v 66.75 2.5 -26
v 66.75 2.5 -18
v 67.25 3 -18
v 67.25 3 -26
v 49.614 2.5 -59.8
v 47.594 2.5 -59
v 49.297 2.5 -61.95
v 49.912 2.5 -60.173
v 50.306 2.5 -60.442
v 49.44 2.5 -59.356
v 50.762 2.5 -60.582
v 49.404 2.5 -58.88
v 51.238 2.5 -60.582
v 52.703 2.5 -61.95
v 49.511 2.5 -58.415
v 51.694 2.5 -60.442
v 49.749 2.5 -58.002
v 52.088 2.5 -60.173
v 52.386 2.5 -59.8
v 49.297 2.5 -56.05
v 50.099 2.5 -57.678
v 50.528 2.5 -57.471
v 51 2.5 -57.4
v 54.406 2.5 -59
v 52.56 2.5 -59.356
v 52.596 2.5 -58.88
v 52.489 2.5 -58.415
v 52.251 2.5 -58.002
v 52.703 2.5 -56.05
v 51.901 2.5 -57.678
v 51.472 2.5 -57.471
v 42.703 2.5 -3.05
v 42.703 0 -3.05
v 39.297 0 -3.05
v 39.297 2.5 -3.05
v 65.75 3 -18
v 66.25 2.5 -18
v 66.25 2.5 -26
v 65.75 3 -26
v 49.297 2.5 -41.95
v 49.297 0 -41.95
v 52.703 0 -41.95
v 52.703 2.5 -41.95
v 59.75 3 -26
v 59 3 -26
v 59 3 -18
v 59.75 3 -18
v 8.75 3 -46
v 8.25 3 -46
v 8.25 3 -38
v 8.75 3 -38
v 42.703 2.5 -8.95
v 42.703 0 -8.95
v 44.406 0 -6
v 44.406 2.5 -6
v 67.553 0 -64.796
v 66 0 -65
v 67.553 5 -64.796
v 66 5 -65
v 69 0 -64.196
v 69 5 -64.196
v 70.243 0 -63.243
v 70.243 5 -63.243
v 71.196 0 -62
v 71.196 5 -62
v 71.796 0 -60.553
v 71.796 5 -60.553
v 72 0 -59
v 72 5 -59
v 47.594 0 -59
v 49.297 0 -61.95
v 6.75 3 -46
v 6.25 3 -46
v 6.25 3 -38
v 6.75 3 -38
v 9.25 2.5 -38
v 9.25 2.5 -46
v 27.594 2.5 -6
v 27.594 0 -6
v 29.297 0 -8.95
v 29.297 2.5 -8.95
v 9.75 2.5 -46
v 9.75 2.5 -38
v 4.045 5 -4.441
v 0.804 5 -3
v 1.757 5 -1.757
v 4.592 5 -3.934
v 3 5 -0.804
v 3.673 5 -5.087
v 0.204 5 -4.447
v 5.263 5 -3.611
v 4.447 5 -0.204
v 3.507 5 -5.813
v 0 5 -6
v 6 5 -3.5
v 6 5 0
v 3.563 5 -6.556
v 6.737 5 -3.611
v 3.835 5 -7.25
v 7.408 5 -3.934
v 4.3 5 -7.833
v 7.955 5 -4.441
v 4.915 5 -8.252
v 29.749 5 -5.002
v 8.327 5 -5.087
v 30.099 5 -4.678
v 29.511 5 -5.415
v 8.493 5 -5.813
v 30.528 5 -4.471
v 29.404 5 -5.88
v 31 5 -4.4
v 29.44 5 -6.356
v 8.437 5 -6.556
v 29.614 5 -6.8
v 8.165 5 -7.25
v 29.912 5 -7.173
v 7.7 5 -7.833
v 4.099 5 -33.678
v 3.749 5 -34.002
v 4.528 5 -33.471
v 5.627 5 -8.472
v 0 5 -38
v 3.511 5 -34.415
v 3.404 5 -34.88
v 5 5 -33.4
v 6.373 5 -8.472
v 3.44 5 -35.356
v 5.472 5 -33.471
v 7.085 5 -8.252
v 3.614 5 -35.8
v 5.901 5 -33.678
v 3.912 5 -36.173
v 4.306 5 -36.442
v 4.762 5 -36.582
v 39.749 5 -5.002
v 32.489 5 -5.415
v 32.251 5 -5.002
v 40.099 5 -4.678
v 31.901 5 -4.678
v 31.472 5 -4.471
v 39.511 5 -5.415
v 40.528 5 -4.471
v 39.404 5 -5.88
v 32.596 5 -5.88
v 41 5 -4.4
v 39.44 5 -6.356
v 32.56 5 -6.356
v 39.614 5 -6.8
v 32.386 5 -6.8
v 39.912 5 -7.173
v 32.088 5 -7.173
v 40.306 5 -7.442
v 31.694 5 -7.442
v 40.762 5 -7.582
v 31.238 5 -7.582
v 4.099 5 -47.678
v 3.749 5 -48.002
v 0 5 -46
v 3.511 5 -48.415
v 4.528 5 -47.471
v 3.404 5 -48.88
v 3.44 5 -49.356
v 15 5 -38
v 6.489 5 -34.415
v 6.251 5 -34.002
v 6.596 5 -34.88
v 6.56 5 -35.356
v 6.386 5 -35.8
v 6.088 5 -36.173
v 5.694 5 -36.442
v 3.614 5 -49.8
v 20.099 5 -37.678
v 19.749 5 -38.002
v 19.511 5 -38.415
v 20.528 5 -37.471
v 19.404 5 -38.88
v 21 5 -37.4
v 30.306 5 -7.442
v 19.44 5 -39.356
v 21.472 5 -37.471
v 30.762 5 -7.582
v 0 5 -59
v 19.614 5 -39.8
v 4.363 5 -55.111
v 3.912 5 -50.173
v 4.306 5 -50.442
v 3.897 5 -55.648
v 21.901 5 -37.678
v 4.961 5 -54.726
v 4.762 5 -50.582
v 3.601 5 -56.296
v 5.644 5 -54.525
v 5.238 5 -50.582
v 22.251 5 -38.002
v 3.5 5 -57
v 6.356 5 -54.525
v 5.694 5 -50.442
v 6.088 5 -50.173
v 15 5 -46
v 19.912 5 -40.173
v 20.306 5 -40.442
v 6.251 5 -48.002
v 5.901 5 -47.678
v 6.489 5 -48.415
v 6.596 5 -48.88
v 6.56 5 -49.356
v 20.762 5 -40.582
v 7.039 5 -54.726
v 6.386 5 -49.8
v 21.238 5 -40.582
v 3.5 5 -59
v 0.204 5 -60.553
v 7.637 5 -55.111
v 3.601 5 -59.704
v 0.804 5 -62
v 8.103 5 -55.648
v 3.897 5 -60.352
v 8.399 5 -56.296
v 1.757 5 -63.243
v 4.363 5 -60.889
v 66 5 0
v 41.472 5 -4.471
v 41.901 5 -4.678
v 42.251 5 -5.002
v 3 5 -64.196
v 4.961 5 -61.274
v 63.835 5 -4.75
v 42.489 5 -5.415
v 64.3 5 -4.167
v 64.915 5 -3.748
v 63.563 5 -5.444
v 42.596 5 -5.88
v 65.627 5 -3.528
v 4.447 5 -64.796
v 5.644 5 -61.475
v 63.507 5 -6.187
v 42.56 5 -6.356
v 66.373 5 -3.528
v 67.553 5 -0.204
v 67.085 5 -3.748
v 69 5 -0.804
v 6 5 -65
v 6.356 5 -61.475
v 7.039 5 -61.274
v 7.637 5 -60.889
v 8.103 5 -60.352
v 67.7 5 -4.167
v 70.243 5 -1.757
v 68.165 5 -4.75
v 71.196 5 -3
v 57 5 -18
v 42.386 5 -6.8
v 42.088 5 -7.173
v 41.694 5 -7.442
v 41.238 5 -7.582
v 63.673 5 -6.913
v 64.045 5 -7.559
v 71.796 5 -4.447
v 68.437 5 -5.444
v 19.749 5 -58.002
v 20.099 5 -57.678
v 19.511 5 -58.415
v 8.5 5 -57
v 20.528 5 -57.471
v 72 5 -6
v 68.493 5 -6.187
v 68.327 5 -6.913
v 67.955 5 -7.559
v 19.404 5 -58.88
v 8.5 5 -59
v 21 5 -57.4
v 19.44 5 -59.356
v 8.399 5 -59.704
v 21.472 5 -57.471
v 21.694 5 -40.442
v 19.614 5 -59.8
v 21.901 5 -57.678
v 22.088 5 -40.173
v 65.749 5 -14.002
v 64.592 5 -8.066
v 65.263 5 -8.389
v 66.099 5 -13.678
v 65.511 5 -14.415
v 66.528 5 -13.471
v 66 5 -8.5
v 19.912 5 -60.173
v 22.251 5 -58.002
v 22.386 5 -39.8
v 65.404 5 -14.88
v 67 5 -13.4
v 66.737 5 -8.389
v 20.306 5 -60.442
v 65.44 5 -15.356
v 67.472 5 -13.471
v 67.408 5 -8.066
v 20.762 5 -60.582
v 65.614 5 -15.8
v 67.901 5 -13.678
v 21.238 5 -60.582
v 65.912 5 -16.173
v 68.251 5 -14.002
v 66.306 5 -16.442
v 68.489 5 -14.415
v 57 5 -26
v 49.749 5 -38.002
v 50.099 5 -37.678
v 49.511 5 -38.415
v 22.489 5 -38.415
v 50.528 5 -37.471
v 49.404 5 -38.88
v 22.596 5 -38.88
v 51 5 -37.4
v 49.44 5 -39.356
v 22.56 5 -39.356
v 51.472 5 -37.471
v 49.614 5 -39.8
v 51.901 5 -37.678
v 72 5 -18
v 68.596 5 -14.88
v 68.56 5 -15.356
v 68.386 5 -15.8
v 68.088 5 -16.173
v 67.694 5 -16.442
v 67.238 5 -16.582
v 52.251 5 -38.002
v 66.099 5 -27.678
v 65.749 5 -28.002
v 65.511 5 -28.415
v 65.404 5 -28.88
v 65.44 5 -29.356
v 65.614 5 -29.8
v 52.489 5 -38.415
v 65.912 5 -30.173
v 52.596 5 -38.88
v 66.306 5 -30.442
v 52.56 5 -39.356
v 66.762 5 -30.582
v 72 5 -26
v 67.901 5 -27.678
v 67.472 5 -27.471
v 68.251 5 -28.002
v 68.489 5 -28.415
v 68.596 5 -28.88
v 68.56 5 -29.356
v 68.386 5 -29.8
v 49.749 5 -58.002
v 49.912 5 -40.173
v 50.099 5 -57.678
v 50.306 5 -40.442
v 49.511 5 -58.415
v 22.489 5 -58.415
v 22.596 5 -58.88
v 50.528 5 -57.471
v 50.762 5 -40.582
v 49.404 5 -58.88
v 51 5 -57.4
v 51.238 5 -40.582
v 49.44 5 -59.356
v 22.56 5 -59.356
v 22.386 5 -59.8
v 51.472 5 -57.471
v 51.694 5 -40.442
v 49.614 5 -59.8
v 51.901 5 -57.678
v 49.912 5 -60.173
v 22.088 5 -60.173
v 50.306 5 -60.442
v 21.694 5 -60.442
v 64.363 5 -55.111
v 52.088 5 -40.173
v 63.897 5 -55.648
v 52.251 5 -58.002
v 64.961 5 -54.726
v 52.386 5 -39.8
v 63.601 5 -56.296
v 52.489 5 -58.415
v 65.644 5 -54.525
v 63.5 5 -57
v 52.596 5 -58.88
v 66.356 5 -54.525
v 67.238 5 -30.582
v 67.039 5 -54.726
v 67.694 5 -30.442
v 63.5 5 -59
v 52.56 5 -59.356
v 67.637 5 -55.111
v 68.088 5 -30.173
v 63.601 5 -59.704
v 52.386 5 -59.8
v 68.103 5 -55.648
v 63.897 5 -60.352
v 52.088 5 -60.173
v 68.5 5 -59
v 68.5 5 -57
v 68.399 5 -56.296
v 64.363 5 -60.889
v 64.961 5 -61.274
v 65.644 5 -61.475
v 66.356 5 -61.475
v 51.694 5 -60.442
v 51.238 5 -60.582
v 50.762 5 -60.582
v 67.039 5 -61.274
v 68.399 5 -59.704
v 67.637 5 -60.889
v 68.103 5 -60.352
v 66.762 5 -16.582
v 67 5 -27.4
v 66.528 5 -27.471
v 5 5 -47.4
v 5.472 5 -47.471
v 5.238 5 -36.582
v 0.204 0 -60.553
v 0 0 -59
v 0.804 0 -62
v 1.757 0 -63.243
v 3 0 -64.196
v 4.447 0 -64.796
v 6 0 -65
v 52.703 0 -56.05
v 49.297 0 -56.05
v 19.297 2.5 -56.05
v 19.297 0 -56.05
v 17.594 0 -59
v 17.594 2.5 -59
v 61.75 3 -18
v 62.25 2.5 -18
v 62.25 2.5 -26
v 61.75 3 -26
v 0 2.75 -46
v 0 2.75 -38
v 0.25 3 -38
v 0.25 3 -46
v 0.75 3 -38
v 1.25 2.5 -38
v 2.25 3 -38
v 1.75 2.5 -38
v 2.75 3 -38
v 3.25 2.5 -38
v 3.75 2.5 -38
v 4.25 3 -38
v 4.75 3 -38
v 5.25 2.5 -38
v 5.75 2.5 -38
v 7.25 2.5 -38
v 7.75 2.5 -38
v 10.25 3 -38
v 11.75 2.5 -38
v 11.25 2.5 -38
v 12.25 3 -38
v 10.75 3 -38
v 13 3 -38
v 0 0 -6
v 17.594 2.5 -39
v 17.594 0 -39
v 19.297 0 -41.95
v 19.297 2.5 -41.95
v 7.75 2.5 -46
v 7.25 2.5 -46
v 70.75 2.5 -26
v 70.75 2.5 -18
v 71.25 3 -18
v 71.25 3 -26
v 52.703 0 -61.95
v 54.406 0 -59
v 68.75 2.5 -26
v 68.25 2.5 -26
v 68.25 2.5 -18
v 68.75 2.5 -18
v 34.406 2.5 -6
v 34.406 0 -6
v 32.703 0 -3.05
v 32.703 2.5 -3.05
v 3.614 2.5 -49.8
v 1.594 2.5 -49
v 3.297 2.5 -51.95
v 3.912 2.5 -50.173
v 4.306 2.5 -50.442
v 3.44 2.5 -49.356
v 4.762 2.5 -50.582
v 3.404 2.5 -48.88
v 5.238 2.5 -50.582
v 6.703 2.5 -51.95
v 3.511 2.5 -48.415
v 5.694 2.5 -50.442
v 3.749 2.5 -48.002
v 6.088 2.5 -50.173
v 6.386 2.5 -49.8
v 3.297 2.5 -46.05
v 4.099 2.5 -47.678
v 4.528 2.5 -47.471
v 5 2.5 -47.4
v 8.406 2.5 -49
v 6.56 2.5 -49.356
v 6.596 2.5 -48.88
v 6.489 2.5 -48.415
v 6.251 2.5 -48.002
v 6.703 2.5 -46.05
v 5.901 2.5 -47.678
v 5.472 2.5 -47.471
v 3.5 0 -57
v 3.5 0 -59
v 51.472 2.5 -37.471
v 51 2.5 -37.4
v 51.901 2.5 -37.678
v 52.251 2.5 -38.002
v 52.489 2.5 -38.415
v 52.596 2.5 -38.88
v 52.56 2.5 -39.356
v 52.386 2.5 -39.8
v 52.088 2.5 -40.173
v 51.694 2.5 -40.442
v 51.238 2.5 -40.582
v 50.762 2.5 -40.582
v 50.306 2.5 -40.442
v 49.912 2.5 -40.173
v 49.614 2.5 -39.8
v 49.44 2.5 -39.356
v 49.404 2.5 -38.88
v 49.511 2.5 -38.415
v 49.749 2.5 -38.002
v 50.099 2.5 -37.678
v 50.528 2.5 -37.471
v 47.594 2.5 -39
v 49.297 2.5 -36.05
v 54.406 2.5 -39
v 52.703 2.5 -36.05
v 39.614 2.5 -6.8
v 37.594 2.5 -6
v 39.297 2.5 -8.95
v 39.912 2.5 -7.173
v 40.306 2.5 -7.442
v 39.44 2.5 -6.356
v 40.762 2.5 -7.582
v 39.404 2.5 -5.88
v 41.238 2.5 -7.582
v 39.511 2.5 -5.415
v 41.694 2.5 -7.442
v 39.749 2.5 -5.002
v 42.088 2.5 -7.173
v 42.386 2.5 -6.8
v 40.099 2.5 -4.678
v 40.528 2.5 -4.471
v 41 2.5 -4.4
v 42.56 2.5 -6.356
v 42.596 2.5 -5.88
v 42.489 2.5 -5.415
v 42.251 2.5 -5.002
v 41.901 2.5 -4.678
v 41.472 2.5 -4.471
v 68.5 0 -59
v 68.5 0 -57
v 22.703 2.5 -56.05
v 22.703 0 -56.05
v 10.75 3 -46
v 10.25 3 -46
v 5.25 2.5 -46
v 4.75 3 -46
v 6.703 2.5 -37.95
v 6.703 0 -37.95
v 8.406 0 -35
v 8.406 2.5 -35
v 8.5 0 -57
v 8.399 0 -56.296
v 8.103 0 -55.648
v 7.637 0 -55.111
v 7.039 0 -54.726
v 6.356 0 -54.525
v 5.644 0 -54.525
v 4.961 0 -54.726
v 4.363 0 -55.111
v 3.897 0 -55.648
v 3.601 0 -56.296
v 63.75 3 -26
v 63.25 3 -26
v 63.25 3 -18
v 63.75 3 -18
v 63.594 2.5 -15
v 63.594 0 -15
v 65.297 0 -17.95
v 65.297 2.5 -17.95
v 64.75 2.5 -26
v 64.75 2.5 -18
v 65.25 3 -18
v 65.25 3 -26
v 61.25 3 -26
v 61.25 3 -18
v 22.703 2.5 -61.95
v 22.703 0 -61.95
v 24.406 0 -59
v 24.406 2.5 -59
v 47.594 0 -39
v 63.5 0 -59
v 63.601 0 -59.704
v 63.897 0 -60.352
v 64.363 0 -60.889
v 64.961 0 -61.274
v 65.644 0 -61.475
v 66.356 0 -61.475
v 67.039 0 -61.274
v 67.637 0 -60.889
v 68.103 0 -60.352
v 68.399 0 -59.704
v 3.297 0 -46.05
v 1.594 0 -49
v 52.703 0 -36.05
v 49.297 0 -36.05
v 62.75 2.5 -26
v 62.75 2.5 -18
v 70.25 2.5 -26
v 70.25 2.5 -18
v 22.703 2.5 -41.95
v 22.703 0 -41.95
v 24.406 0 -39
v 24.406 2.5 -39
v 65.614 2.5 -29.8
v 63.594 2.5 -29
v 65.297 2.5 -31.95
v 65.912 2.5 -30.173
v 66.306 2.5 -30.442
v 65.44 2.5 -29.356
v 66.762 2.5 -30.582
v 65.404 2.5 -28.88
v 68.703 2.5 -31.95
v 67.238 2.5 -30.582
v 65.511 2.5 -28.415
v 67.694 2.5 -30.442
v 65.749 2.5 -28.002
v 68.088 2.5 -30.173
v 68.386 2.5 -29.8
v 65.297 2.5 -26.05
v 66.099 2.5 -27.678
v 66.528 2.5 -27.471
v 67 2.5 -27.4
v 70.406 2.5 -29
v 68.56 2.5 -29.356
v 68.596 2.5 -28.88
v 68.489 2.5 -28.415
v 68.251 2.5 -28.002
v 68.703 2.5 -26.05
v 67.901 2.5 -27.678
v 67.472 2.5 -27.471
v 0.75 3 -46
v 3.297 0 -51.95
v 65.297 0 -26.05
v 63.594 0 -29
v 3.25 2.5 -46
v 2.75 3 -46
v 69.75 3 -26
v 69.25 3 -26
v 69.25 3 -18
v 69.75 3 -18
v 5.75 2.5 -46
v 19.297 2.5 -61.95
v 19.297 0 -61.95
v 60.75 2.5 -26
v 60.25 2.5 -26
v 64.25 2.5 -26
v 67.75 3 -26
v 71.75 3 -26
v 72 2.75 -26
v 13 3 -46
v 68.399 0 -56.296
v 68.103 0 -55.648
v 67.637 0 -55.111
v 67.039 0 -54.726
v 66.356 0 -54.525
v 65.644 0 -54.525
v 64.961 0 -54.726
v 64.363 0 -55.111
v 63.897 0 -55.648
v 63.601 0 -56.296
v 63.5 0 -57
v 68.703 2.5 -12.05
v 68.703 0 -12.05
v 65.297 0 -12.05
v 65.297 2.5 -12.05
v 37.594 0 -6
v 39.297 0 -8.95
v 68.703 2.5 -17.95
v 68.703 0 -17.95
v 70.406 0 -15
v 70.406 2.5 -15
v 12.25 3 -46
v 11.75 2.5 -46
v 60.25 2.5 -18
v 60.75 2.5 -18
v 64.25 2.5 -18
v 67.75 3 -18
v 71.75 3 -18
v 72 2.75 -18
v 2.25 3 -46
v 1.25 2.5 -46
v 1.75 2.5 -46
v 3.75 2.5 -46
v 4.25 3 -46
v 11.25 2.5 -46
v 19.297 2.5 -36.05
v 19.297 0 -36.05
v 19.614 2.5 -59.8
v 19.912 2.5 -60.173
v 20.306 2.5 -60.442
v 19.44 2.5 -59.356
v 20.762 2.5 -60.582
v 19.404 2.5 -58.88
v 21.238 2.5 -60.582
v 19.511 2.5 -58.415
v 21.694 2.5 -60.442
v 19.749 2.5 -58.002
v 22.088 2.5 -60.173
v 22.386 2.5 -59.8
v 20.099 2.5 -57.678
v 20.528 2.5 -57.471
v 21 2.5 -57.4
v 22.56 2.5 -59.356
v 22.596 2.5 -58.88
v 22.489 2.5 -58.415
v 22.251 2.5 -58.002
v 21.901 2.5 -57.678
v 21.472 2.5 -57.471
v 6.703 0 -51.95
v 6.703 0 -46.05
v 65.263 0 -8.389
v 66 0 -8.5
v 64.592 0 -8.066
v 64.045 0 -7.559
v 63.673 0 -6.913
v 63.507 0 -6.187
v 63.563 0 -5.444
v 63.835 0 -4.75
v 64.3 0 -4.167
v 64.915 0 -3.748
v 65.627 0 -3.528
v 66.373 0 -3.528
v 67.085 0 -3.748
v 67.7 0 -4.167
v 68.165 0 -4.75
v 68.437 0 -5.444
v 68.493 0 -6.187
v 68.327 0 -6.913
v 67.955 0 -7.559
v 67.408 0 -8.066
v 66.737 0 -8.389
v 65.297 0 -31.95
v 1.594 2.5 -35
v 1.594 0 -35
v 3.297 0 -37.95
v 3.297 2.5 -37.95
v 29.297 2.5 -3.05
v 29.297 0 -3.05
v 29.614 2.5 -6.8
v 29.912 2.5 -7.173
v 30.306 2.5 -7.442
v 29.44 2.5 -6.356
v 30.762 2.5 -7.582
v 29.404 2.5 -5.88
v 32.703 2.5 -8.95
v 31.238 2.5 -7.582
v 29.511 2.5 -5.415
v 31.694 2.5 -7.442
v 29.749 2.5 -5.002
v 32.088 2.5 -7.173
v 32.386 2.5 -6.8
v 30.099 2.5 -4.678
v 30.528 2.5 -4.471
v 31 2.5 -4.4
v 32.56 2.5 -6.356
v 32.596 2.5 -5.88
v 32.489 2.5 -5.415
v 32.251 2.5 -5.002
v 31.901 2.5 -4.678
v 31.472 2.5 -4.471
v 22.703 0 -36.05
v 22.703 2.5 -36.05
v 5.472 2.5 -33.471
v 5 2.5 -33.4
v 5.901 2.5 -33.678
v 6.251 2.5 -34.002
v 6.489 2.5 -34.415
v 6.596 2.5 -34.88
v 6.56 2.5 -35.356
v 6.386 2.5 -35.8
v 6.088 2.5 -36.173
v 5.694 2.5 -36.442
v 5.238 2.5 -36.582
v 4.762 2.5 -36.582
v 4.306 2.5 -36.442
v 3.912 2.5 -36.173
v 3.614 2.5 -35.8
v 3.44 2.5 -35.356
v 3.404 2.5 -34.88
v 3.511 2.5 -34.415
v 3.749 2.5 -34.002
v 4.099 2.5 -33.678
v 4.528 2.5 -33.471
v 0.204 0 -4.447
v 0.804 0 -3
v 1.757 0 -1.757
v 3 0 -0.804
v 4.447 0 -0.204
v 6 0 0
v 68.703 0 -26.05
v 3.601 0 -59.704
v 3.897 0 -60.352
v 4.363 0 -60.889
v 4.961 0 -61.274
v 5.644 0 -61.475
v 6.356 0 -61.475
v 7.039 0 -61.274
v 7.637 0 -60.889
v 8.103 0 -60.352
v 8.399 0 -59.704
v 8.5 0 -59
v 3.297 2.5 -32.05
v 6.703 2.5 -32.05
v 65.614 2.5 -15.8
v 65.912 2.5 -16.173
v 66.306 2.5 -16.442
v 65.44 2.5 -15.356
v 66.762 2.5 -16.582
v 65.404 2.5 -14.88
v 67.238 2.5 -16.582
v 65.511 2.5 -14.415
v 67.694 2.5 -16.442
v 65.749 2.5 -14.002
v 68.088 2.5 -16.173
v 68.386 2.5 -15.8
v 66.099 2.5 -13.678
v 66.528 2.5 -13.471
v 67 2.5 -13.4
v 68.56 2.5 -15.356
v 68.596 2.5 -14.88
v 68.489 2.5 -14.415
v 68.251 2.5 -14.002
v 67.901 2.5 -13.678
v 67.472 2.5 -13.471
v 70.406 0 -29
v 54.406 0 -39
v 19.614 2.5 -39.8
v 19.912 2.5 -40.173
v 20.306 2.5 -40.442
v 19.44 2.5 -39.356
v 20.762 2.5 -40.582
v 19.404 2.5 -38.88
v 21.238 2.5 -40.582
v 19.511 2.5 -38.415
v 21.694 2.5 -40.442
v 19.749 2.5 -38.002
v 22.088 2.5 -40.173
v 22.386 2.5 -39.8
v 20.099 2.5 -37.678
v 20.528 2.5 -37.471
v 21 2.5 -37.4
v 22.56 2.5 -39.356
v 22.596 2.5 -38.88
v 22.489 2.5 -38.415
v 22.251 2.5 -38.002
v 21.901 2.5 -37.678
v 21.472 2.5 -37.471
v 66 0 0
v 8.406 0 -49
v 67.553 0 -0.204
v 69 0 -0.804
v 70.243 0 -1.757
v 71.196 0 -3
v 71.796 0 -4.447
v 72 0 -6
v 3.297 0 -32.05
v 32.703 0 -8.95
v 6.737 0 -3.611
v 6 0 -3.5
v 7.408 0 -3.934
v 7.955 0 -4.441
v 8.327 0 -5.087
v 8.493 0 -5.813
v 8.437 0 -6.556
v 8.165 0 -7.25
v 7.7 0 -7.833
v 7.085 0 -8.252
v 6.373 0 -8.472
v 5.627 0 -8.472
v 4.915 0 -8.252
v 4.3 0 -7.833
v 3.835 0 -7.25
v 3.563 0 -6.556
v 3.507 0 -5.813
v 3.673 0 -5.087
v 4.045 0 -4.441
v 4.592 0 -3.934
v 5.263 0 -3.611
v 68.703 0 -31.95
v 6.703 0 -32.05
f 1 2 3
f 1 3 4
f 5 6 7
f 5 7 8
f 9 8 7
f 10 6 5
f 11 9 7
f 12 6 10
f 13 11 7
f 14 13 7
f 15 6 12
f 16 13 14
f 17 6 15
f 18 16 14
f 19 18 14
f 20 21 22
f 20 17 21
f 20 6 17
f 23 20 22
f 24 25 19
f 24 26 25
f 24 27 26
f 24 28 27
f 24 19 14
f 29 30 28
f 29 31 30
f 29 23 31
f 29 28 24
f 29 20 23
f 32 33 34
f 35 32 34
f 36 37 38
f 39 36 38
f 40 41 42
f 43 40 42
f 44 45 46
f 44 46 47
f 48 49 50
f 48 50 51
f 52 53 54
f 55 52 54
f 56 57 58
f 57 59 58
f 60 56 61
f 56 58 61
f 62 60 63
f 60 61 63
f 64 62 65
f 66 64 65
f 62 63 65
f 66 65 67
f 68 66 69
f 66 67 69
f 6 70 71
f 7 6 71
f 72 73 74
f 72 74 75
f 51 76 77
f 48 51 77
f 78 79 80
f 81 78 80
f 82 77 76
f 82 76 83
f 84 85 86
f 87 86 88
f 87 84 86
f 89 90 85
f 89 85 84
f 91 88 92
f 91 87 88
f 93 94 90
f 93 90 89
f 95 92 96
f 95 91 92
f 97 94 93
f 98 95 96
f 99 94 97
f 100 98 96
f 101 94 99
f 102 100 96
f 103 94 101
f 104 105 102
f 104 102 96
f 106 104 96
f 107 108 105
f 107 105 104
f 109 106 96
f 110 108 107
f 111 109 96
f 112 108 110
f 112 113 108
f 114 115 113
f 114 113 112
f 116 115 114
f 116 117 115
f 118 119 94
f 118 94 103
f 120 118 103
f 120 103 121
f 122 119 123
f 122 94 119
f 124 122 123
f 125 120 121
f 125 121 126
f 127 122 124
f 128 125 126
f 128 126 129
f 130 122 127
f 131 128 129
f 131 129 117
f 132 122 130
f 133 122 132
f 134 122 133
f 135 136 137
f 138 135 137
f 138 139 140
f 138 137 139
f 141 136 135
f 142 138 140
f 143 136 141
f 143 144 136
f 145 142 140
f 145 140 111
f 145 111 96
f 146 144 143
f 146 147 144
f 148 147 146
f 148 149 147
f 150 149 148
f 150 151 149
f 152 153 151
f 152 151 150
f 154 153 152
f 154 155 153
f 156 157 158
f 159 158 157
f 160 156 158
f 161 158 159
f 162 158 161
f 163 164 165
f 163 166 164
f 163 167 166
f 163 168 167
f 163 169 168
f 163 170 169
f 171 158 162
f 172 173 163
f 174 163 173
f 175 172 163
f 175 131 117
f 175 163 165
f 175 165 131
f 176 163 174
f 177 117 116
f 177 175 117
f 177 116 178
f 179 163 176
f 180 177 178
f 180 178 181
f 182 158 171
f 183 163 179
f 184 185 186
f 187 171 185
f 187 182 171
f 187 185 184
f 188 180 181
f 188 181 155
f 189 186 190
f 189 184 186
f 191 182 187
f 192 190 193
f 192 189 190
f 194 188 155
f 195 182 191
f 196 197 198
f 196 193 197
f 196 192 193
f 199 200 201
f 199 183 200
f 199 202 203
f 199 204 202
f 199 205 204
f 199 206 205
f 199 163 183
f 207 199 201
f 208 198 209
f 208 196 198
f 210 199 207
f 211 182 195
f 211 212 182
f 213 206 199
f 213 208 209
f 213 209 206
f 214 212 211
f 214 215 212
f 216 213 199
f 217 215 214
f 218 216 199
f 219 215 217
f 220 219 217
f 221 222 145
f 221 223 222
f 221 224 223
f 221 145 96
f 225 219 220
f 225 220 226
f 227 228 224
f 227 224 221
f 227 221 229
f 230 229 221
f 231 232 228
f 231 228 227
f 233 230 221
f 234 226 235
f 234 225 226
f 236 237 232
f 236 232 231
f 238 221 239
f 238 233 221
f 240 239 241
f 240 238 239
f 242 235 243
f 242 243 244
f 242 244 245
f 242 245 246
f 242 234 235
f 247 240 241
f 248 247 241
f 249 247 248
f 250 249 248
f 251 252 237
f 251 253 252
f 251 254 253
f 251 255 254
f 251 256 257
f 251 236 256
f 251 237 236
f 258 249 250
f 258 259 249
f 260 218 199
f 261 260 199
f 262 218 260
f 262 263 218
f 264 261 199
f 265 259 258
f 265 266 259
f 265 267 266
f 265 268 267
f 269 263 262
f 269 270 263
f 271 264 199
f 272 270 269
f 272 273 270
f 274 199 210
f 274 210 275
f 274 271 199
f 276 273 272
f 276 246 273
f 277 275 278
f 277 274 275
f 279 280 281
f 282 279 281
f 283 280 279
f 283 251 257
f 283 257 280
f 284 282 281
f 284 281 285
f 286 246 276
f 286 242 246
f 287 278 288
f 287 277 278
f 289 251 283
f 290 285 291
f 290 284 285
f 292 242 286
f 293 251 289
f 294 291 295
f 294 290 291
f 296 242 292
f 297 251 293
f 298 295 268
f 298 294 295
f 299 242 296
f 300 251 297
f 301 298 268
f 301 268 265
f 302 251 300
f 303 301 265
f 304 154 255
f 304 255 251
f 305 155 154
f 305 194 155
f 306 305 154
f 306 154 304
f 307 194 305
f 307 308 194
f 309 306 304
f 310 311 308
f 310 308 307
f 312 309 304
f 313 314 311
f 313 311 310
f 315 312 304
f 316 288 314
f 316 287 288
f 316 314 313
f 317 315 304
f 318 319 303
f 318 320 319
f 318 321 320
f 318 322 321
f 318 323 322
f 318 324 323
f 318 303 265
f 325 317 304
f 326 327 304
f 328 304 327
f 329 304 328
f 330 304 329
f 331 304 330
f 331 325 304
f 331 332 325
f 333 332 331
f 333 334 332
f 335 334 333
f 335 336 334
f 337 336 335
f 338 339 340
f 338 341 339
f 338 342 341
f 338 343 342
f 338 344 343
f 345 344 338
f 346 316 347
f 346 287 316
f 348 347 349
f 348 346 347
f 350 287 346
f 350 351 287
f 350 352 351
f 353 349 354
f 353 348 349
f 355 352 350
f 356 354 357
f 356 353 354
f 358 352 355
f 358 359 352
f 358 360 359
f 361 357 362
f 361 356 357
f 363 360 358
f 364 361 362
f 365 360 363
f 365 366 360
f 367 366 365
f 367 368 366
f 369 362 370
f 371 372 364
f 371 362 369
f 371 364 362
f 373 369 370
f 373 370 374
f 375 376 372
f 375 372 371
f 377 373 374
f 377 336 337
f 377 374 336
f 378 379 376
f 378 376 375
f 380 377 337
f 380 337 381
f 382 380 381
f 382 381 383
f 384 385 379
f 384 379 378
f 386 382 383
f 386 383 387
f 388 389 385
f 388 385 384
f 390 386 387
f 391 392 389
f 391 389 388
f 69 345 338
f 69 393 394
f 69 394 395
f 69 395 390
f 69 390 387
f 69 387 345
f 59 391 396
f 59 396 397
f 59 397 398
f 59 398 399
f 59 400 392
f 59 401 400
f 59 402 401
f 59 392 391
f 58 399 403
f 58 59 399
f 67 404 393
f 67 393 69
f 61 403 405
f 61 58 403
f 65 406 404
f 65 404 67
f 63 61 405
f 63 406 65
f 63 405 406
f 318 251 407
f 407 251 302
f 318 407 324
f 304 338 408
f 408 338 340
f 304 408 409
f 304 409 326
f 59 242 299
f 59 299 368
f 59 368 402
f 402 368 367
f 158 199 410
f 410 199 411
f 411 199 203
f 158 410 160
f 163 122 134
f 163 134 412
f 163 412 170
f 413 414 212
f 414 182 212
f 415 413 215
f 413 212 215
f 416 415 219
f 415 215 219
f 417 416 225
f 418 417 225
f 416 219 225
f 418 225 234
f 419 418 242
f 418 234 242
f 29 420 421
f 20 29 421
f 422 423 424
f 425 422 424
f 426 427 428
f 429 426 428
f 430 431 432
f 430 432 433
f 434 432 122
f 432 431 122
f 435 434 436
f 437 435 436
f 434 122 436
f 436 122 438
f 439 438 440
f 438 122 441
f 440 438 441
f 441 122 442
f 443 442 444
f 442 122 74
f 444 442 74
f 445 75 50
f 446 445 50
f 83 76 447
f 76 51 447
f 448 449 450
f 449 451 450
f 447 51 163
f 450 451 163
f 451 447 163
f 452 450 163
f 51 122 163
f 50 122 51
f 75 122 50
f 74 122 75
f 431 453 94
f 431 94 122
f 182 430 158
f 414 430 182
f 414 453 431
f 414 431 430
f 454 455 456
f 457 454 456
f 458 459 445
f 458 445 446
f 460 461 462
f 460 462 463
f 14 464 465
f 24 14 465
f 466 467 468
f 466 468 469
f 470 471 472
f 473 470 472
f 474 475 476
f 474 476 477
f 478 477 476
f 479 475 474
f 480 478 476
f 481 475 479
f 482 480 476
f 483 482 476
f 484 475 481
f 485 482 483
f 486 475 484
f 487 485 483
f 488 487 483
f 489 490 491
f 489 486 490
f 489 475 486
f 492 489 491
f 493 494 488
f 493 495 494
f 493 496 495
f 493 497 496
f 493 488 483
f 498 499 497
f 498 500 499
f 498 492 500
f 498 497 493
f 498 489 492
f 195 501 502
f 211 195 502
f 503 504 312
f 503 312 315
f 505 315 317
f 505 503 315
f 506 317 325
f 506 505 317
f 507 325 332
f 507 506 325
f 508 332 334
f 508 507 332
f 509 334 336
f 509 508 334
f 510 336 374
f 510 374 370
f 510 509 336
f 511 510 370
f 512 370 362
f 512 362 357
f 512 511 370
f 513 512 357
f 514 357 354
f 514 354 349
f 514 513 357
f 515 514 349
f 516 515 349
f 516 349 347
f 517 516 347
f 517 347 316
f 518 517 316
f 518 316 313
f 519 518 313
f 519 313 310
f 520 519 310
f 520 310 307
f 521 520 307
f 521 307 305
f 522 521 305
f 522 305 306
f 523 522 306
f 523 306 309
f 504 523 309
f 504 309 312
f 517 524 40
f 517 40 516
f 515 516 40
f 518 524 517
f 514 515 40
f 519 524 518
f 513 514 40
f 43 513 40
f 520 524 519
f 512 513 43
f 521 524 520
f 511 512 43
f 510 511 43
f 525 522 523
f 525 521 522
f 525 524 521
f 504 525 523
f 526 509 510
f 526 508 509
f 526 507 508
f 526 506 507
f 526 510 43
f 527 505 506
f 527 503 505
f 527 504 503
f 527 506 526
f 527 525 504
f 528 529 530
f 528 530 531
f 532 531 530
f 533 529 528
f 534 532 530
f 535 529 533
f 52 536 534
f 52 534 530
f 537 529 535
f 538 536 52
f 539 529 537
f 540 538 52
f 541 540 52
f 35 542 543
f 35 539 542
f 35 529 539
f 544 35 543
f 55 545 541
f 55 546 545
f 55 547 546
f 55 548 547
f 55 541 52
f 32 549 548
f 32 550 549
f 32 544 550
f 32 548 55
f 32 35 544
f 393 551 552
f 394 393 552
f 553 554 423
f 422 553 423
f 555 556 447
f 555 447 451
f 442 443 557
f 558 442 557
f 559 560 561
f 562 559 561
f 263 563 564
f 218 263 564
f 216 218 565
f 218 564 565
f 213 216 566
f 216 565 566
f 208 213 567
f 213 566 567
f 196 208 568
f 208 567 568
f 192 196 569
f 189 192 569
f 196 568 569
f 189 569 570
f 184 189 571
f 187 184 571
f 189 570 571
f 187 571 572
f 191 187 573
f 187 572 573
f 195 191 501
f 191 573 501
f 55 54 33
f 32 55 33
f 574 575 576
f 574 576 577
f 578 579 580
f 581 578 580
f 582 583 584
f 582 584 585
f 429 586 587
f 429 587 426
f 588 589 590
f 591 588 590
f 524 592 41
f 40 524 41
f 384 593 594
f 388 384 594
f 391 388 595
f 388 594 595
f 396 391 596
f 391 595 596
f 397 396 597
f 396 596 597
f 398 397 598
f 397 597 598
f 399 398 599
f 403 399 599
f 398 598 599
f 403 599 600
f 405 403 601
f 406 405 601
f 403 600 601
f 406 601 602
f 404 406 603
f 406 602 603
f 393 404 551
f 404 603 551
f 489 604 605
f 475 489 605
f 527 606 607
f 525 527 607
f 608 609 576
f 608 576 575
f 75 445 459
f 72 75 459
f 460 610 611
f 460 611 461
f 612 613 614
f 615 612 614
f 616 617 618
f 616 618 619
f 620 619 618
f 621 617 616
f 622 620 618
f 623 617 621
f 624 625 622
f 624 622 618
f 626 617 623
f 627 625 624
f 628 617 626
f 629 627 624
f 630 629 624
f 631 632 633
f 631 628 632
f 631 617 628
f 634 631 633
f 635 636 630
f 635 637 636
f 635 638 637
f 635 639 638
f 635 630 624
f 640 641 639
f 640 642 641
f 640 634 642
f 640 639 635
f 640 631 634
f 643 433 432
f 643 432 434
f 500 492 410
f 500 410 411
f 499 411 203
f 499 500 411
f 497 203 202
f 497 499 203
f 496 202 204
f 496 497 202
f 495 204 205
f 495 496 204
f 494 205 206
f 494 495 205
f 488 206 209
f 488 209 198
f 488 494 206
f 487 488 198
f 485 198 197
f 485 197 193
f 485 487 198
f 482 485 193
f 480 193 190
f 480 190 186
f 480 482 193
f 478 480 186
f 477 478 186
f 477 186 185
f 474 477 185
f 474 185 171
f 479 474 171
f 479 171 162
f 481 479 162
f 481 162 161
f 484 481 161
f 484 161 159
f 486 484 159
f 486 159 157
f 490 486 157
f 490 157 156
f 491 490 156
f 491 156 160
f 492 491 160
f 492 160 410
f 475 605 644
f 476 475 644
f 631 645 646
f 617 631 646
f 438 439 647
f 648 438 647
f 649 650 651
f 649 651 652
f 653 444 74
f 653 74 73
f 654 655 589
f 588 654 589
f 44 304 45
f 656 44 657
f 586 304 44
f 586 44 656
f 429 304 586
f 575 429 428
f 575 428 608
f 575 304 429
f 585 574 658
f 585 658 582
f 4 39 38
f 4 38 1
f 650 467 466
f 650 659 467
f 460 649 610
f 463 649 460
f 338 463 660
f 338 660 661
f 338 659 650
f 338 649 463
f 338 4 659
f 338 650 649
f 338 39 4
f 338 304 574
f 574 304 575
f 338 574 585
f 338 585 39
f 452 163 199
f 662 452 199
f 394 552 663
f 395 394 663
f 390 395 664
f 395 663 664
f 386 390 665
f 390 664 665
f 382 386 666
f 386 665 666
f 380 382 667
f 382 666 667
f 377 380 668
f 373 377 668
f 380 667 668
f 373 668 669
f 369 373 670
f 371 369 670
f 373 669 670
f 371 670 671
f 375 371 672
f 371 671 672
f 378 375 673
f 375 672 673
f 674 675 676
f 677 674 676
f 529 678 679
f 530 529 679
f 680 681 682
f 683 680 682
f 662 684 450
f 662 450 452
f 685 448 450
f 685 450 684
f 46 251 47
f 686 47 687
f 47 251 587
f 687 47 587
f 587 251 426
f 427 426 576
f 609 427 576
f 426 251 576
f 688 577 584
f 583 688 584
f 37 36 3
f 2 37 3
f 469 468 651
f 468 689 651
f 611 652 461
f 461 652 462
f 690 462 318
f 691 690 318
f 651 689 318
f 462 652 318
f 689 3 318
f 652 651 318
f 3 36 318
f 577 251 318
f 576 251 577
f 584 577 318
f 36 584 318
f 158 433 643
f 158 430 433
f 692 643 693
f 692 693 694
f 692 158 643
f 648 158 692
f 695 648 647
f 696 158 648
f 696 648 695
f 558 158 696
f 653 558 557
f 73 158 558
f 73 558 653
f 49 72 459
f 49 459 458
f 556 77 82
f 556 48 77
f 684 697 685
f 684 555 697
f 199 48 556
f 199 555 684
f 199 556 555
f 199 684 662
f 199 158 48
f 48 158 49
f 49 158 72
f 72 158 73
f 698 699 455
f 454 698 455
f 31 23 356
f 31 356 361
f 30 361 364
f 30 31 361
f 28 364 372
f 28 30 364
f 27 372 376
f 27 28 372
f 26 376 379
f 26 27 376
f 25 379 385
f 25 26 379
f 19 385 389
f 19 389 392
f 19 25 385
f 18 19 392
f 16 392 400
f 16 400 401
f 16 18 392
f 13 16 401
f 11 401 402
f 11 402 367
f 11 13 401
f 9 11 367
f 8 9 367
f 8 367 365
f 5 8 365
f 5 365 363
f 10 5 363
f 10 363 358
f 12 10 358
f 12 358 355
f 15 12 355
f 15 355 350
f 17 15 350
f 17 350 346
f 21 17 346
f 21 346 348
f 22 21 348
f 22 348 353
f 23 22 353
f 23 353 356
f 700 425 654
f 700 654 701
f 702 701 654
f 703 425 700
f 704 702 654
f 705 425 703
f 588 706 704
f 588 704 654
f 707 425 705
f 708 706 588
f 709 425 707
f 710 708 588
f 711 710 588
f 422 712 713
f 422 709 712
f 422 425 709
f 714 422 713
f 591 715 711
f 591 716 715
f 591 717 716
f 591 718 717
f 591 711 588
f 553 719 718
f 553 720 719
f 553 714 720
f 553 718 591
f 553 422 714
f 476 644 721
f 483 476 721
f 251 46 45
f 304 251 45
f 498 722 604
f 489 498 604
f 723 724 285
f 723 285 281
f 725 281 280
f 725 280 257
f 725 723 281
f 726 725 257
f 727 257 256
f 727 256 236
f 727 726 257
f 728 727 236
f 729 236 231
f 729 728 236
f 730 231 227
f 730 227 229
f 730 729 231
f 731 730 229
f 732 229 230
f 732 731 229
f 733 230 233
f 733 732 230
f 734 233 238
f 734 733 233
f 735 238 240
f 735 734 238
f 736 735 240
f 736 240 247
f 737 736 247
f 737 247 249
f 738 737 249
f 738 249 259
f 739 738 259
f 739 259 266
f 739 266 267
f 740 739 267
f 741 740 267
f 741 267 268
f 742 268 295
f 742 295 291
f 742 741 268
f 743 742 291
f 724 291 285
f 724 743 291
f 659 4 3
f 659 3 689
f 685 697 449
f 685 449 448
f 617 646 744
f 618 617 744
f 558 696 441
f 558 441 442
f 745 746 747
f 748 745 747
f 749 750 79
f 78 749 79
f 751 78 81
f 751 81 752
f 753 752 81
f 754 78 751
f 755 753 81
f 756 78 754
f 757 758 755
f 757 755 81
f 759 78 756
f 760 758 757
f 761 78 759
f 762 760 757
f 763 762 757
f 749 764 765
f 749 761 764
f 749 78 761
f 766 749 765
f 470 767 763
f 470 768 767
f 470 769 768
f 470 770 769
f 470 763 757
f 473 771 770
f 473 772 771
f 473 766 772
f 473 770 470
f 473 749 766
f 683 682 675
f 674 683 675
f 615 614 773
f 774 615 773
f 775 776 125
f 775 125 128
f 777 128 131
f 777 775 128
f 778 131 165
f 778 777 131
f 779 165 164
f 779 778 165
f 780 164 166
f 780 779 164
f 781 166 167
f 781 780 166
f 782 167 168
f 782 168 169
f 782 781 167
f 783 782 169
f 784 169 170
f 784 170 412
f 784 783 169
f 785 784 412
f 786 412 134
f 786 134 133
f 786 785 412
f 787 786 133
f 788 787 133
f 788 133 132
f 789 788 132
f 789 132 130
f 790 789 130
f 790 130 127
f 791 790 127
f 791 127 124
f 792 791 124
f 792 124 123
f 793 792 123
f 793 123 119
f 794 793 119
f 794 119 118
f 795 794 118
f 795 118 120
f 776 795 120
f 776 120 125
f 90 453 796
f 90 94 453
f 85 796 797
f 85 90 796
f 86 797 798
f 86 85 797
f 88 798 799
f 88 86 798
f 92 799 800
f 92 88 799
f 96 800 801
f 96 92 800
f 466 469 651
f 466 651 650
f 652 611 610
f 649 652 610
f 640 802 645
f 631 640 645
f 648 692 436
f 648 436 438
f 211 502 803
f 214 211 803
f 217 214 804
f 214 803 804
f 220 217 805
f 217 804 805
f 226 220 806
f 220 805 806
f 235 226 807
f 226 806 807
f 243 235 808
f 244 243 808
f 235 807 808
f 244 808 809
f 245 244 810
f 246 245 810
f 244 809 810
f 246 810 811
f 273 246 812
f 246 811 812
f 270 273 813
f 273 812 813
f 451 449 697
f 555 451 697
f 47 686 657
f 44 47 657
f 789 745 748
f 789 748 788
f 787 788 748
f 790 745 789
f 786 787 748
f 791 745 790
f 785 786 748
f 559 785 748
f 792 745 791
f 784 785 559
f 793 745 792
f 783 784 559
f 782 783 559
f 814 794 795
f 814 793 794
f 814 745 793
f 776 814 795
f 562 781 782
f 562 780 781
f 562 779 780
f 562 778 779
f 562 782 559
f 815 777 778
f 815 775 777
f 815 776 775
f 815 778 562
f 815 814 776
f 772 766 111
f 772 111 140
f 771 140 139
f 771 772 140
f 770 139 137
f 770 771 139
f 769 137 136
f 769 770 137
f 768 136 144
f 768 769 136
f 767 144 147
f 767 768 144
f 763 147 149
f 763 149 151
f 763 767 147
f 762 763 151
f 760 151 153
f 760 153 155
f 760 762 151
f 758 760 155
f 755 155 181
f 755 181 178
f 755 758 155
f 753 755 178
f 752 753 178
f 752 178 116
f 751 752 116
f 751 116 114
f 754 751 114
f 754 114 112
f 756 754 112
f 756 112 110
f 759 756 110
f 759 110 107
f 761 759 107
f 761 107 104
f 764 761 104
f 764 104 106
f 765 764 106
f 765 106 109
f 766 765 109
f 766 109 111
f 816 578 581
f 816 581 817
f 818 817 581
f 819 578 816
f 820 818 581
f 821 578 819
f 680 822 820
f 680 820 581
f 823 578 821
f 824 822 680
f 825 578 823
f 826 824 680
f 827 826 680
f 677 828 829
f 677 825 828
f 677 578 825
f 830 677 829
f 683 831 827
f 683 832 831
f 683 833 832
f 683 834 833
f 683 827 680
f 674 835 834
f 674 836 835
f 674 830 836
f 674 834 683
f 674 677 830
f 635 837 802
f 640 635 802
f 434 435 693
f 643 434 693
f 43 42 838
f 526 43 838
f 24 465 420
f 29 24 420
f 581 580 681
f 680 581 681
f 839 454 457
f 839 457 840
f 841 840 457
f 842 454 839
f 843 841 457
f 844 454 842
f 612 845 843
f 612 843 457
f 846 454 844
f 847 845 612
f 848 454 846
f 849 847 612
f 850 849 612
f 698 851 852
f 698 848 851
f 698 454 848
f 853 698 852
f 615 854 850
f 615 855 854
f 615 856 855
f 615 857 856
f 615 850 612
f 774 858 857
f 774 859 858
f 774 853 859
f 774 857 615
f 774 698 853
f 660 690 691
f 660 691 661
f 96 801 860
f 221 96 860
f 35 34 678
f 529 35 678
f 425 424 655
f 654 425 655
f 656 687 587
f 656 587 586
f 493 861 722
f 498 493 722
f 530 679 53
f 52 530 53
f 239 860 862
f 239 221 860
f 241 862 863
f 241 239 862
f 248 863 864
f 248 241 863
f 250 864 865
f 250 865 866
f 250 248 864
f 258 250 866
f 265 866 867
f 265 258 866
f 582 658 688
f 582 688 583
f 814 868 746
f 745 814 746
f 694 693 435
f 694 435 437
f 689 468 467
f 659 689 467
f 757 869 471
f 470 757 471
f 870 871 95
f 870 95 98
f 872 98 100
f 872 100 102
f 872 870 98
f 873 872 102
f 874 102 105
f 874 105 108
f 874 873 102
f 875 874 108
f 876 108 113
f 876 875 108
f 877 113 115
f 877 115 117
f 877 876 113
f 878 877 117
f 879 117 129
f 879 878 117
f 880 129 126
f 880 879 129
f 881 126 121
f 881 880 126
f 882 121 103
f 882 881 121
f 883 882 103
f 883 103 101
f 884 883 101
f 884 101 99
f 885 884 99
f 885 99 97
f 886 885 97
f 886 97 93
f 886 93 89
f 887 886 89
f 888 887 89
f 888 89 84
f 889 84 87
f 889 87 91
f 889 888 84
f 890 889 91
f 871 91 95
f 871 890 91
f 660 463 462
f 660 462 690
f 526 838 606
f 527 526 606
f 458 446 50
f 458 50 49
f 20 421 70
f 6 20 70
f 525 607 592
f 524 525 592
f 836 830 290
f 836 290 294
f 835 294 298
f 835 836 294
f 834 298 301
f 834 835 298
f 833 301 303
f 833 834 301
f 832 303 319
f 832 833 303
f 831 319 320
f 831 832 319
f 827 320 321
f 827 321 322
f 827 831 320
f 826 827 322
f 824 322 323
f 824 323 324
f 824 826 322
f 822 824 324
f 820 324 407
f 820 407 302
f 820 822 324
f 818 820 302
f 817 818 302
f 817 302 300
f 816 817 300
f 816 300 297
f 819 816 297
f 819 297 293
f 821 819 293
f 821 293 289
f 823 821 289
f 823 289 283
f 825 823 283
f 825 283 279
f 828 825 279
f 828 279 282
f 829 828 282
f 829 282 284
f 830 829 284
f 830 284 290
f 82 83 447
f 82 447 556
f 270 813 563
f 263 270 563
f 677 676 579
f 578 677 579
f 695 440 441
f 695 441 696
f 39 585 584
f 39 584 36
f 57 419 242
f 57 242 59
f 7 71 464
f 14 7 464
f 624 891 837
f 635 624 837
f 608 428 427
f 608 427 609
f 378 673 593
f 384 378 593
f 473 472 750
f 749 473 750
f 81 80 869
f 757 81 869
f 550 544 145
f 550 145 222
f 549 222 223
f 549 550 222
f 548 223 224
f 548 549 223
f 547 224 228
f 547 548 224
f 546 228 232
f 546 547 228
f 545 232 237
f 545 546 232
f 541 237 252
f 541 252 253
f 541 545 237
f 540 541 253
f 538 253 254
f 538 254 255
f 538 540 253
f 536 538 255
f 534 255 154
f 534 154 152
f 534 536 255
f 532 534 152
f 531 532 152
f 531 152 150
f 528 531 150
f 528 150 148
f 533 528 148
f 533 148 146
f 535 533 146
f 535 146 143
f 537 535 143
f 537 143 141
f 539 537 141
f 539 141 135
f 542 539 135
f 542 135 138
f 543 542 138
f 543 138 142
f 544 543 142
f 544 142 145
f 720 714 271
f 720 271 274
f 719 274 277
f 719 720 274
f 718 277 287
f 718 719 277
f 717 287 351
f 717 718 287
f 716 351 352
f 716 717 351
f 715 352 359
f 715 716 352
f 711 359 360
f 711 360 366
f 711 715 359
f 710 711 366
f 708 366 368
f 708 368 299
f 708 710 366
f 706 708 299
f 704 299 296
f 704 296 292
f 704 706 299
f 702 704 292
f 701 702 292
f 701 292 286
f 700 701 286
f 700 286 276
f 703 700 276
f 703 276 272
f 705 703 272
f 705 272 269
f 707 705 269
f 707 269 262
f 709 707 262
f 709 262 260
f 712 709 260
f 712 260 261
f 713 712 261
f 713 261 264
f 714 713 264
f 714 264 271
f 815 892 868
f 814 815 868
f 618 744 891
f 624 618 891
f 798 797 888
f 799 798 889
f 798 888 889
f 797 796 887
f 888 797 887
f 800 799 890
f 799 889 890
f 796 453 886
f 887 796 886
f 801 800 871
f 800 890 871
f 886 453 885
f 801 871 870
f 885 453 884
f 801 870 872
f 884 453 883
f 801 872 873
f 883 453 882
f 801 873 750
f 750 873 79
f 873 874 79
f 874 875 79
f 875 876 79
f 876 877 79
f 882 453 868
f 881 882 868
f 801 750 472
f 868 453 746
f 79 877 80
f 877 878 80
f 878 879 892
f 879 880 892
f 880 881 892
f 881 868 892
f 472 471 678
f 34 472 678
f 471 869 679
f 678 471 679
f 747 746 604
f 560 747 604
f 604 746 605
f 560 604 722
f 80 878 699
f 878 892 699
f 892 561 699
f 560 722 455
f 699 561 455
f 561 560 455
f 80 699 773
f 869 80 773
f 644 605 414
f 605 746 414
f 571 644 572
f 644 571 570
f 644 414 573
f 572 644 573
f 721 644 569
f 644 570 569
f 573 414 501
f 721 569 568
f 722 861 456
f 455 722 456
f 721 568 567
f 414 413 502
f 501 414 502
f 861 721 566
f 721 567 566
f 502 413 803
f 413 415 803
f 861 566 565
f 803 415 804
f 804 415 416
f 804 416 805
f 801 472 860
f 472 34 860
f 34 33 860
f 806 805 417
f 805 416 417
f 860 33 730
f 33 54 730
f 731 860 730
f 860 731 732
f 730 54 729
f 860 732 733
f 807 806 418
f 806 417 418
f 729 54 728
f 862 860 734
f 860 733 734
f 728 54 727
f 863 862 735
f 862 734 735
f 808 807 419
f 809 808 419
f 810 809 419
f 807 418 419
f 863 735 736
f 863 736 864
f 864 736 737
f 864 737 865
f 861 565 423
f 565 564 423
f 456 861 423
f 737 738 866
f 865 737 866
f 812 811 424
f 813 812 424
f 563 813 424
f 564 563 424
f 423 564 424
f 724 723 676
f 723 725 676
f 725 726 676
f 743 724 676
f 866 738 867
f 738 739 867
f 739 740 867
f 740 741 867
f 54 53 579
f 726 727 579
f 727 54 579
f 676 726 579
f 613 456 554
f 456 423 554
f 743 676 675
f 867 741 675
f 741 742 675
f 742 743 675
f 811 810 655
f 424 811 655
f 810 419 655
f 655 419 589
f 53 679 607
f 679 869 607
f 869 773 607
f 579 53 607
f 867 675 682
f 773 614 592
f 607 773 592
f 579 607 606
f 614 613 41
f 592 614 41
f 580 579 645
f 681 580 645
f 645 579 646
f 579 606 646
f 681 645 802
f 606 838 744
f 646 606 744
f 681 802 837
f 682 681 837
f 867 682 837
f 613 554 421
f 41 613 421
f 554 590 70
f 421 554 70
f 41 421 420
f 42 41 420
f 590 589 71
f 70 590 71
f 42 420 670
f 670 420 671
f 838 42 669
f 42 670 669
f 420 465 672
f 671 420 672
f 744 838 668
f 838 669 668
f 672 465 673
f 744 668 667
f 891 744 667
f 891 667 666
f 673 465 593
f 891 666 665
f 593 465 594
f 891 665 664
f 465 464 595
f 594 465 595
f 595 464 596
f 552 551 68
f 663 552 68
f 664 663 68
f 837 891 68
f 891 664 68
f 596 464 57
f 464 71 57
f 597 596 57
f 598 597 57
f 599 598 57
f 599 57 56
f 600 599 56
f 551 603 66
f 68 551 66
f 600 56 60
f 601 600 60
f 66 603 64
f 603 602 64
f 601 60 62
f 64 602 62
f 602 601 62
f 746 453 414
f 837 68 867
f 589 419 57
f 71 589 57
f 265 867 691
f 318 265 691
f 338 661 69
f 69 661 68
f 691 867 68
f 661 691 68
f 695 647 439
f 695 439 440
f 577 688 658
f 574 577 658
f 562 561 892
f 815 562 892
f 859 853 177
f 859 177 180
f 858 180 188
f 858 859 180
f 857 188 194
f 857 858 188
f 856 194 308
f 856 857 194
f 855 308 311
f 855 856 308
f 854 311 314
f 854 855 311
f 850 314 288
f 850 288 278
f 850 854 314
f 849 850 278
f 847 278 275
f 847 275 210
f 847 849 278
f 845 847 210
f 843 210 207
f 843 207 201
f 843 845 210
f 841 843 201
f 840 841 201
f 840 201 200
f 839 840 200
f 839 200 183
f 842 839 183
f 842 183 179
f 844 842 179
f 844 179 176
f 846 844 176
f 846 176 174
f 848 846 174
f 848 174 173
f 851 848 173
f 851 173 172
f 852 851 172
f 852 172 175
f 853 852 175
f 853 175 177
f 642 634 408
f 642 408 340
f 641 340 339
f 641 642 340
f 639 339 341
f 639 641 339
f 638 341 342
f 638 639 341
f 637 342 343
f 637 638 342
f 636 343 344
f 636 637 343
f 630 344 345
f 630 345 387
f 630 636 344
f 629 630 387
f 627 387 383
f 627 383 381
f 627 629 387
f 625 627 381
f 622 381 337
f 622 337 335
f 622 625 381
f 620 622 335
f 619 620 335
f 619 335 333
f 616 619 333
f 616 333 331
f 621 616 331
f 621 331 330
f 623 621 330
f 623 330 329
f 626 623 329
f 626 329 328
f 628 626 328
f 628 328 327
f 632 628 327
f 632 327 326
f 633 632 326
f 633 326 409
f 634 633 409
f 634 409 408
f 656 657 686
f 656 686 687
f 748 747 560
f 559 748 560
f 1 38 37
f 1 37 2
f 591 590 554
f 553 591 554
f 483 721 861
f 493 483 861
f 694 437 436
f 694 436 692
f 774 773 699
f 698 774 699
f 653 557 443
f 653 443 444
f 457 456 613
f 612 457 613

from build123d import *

# Parameters (mm, degrees)
SKETCH1_W           = 72
SKETCH1_H           = 65
SKETCH1_R           = 2.5
SKETCH1_R_2         = 1.6
BOSS_EXTRUDE1_DEPTH = 5
FILLET1_R           = 6
SKETCH2_W           = 15
SKETCH2_H           = 8
CUT_EXTRUDE1_DEPTH  = 2
CHAMFER1_SIZE       = 2
SKETCH3_W           = 0.5
SKETCH3_H           = 8
CUT_EXTRUDE2_DEPTH  = 0.5
CHAMFER2_SIZE       = 0.5
CHAMFER3_SIZE       = 0.25
CUT_EXTRUDE3_DEPTH  = 2.5


with BuildPart() as part:
    # Sketch1 → Boss-Extrude1 (new body)
    with BuildSketch(Plane(origin=(0, 0, 0), x_dir=(1, 0, 0), z_dir=(0, 1, 0))):
        with Locations((36, 32.5)):
            Rectangle(SKETCH1_W, SKETCH1_H)
        with Locations(Location((6, 6, 0), (0, 0, 270))):
            Circle(SKETCH1_R, mode=Mode.SUBTRACT)
        with Locations(Location((66, 6, 0), (0, 0, 90))):
            Circle(SKETCH1_R, mode=Mode.SUBTRACT)
        with Locations(Location((5, 49, 0), (0, 0, 270))):
            Circle(SKETCH1_R_2, mode=Mode.SUBTRACT)
        with Locations(Location((5, 35, 0), (0, 0, 270))):
            Circle(SKETCH1_R_2, mode=Mode.SUBTRACT)
        with Locations(Location((21, 39, 0), (0, 0, 270))):
            Circle(SKETCH1_R_2, mode=Mode.SUBTRACT)
        with Locations(Location((21, 59, 0), (0, 0, 270))):
            Circle(SKETCH1_R_2, mode=Mode.SUBTRACT)
        with Locations(Location((51, 59, 0), (0, 0, 270))):
            Circle(SKETCH1_R_2, mode=Mode.SUBTRACT)
        with Locations(Location((51, 39, 0), (0, 0, 270))):
            Circle(SKETCH1_R_2, mode=Mode.SUBTRACT)
        with Locations(Location((67, 29, 0), (0, 0, 270))):
            Circle(SKETCH1_R_2, mode=Mode.SUBTRACT)
        with Locations(Location((67, 15, 0), (0, 0, 270))):
            Circle(SKETCH1_R_2, mode=Mode.SUBTRACT)
        with Locations(Location((41, 6, 0), (0, 0, 270))):
            Circle(SKETCH1_R_2, mode=Mode.SUBTRACT)
        with Locations(Location((31, 6, 0), (0, 0, 270))):
            Circle(SKETCH1_R_2, mode=Mode.SUBTRACT)
        with BuildLine():
            Line((8.5, 59), (8.5, 57))
            ThreePointArc((8.5, 57), (6, 54.5), (3.5, 57))
            Line((3.5, 57), (3.5, 59))
            ThreePointArc((3.5, 59), (6, 61.5), (8.5, 59))
        make_face(mode=Mode.SUBTRACT)
        with BuildLine():
            Line((68.5, 59), (68.5, 57))
            ThreePointArc((68.5, 57), (66, 54.5), (63.5, 57))
            Line((63.5, 57), (63.5, 59))
            ThreePointArc((63.5, 59), (66, 61.5), (68.5, 59))
        make_face(mode=Mode.SUBTRACT)
    extrude(amount=BOSS_EXTRUDE1_DEPTH)

    # Fillet1
    fillet1_edges = [part.edges().sort_by_distance(p)[0] for p in [
        (0, 2.5, -65),
        (72, 2.5, -65),
        (72, 2.5, 0),
        (0, 2.5, 0),
    ]]
    fillet(fillet1_edges, radius=FILLET1_R)

    # Sketch2 → Cut-Extrude1 (cut)
    with BuildSketch(Plane(origin=(0, 5, 0), x_dir=(1, 0, 0), z_dir=(0, 1, 0))):
        with Locations((7.5, 42)):
            Rectangle(SKETCH2_W, SKETCH2_H)
        with Locations((64.5, 22)):
            Rectangle(SKETCH2_W, SKETCH2_H)
    extrude(amount=-CUT_EXTRUDE1_DEPTH, mode=Mode.SUBTRACT)

    # Chamfer1
    chamfer1_edges = [part.edges().sort_by_distance(p)[0] for p in [
        (57, 3, -22),
        (15, 3, -42),
    ]]
    chamfer(chamfer1_edges, length=CHAMFER1_SIZE - 0.0001)  # a hair under: the kernel refuses the full size

    # Sketch3 → Cut-Extrude2 (cut)
    with BuildSketch(Plane(origin=(0, 3, 0), x_dir=(1, 0, 0), z_dir=(0, 1, 0))):
        with Locations((1.5, 42)):
            Rectangle(SKETCH3_W, SKETCH3_H)
        with Locations((3.5, 42)):
            Rectangle(SKETCH3_W, SKETCH3_H)
        with Locations((5.5, 42)):
            Rectangle(SKETCH3_W, SKETCH3_H)
        with Locations((11.5, 42)):
            Rectangle(SKETCH3_W, SKETCH3_H)
        with Locations((7.5, 42)):
            Rectangle(SKETCH3_W, SKETCH3_H)
        with Locations((9.5, 42)):
            Rectangle(SKETCH3_W, SKETCH3_H)
        with Locations((70.5, 22)):
            Rectangle(SKETCH3_W, SKETCH3_H)
        with Locations((68.5, 22)):
            Rectangle(SKETCH3_W, SKETCH3_H)
        with Locations((66.5, 22)):
            Rectangle(SKETCH3_W, SKETCH3_H)
        with Locations((64.5, 22)):
            Rectangle(SKETCH3_W, SKETCH3_H)
        with Locations((62.5, 22)):
            Rectangle(SKETCH3_W, SKETCH3_H)
        with Locations((60.5, 22)):
            Rectangle(SKETCH3_W, SKETCH3_H)
    extrude(amount=-CUT_EXTRUDE2_DEPTH, mode=Mode.SUBTRACT)

    # Chamfer2
    chamfer2_edges = [part.edges().sort_by_distance(p)[0] for p in [
        (70.75, 3, -22),
        (70.25, 3, -22),
        (68.75, 3, -22),
        (68.25, 3, -22),
        (66.75, 3, -22),
        (66.25, 3, -22),
        (64.75, 3, -22),
        (64.25, 3, -22),
        (62.75, 3, -22),
        (62.25, 3, -22),
        (60.75, 3, -22),
        (60.25, 3, -22),
        (11.75, 3, -42),
        (11.25, 3, -42),
        (9.75, 3, -42),
        (9.25, 3, -42),
        (7.75, 3, -42),
        (7.25, 3, -42),
        (5.75, 3, -42),
        (5.25, 3, -42),
        (3.75, 3, -42),
        (3.25, 3, -42),
        (1.75, 3, -42),
        (1.25, 3, -42),
    ]]
    chamfer(chamfer2_edges, length=CHAMFER2_SIZE - 0.0001)  # a hair under: the kernel refuses the full size

    # Chamfer3
    chamfer3_edges = [part.edges().sort_by_distance(p)[0] for p in [
        (0, 3, -42),
        (72, 3, -22),
    ]]
    chamfer(chamfer3_edges, length=CHAMFER3_SIZE)

    # Sketch4 → Cut-Extrude3 (cut)
    with BuildSketch(Plane.XZ):
        Polygon((8.406366588, -49), (6.703183294, -46.05), (3.296816706, -46.05), (1.593633412, -49), (3.296816706, -51.95), (6.703183294, -51.95), align=None)
        Polygon((8.406366588, -35), (6.703183294, -32.05), (3.296816706, -32.05), (1.593633412, -35), (3.296816706, -37.95), (6.703183294, -37.95), align=None)
        Polygon((24.406366588, -39), (22.703183294, -36.05), (19.296816706, -36.05), (17.593633412, -39), (19.296816706, -41.95), (22.703183294, -41.95), align=None)
        Polygon((54.406366588, -39), (52.703183294, -36.05), (49.296816706, -36.05), (47.593633412, -39), (49.296816706, -41.95), (52.703183294, -41.95), align=None)
        Polygon((54.406366588, -59), (52.703183294, -56.05), (49.296816706, -56.05), (47.593633412, -59), (49.296816706, -61.95), (52.703183294, -61.95), align=None)
        Polygon((24.406366588, -59), (22.703183294, -56.05), (19.296816706, -56.05), (17.593633412, -59), (19.296816706, -61.95), (22.703183294, -61.95), align=None)
        Polygon((34.406366588, -6), (32.703183294, -3.05), (29.296816706, -3.05), (27.593633412, -6), (29.296816706, -8.95), (32.703183294, -8.95), align=None)
        Polygon((44.406366588, -6), (42.703183294, -3.05), (39.296816706, -3.05), (37.593633412, -6), (39.296816706, -8.95), (42.703183294, -8.95), align=None)
        Polygon((70.406366588, -15), (68.703183294, -12.05), (65.296816706, -12.05), (63.593633412, -15), (65.296816706, -17.95), (68.703183294, -17.95), align=None)
        Polygon((70.406366588, -29), (68.703183294, -26.05), (65.296816706, -26.05), (63.593633412, -29), (65.296816706, -31.95), (68.703183294, -31.95), align=None)
    extrude(amount=-CUT_EXTRUDE3_DEPTH, mode=Mode.SUBTRACT)


solid = part.part
